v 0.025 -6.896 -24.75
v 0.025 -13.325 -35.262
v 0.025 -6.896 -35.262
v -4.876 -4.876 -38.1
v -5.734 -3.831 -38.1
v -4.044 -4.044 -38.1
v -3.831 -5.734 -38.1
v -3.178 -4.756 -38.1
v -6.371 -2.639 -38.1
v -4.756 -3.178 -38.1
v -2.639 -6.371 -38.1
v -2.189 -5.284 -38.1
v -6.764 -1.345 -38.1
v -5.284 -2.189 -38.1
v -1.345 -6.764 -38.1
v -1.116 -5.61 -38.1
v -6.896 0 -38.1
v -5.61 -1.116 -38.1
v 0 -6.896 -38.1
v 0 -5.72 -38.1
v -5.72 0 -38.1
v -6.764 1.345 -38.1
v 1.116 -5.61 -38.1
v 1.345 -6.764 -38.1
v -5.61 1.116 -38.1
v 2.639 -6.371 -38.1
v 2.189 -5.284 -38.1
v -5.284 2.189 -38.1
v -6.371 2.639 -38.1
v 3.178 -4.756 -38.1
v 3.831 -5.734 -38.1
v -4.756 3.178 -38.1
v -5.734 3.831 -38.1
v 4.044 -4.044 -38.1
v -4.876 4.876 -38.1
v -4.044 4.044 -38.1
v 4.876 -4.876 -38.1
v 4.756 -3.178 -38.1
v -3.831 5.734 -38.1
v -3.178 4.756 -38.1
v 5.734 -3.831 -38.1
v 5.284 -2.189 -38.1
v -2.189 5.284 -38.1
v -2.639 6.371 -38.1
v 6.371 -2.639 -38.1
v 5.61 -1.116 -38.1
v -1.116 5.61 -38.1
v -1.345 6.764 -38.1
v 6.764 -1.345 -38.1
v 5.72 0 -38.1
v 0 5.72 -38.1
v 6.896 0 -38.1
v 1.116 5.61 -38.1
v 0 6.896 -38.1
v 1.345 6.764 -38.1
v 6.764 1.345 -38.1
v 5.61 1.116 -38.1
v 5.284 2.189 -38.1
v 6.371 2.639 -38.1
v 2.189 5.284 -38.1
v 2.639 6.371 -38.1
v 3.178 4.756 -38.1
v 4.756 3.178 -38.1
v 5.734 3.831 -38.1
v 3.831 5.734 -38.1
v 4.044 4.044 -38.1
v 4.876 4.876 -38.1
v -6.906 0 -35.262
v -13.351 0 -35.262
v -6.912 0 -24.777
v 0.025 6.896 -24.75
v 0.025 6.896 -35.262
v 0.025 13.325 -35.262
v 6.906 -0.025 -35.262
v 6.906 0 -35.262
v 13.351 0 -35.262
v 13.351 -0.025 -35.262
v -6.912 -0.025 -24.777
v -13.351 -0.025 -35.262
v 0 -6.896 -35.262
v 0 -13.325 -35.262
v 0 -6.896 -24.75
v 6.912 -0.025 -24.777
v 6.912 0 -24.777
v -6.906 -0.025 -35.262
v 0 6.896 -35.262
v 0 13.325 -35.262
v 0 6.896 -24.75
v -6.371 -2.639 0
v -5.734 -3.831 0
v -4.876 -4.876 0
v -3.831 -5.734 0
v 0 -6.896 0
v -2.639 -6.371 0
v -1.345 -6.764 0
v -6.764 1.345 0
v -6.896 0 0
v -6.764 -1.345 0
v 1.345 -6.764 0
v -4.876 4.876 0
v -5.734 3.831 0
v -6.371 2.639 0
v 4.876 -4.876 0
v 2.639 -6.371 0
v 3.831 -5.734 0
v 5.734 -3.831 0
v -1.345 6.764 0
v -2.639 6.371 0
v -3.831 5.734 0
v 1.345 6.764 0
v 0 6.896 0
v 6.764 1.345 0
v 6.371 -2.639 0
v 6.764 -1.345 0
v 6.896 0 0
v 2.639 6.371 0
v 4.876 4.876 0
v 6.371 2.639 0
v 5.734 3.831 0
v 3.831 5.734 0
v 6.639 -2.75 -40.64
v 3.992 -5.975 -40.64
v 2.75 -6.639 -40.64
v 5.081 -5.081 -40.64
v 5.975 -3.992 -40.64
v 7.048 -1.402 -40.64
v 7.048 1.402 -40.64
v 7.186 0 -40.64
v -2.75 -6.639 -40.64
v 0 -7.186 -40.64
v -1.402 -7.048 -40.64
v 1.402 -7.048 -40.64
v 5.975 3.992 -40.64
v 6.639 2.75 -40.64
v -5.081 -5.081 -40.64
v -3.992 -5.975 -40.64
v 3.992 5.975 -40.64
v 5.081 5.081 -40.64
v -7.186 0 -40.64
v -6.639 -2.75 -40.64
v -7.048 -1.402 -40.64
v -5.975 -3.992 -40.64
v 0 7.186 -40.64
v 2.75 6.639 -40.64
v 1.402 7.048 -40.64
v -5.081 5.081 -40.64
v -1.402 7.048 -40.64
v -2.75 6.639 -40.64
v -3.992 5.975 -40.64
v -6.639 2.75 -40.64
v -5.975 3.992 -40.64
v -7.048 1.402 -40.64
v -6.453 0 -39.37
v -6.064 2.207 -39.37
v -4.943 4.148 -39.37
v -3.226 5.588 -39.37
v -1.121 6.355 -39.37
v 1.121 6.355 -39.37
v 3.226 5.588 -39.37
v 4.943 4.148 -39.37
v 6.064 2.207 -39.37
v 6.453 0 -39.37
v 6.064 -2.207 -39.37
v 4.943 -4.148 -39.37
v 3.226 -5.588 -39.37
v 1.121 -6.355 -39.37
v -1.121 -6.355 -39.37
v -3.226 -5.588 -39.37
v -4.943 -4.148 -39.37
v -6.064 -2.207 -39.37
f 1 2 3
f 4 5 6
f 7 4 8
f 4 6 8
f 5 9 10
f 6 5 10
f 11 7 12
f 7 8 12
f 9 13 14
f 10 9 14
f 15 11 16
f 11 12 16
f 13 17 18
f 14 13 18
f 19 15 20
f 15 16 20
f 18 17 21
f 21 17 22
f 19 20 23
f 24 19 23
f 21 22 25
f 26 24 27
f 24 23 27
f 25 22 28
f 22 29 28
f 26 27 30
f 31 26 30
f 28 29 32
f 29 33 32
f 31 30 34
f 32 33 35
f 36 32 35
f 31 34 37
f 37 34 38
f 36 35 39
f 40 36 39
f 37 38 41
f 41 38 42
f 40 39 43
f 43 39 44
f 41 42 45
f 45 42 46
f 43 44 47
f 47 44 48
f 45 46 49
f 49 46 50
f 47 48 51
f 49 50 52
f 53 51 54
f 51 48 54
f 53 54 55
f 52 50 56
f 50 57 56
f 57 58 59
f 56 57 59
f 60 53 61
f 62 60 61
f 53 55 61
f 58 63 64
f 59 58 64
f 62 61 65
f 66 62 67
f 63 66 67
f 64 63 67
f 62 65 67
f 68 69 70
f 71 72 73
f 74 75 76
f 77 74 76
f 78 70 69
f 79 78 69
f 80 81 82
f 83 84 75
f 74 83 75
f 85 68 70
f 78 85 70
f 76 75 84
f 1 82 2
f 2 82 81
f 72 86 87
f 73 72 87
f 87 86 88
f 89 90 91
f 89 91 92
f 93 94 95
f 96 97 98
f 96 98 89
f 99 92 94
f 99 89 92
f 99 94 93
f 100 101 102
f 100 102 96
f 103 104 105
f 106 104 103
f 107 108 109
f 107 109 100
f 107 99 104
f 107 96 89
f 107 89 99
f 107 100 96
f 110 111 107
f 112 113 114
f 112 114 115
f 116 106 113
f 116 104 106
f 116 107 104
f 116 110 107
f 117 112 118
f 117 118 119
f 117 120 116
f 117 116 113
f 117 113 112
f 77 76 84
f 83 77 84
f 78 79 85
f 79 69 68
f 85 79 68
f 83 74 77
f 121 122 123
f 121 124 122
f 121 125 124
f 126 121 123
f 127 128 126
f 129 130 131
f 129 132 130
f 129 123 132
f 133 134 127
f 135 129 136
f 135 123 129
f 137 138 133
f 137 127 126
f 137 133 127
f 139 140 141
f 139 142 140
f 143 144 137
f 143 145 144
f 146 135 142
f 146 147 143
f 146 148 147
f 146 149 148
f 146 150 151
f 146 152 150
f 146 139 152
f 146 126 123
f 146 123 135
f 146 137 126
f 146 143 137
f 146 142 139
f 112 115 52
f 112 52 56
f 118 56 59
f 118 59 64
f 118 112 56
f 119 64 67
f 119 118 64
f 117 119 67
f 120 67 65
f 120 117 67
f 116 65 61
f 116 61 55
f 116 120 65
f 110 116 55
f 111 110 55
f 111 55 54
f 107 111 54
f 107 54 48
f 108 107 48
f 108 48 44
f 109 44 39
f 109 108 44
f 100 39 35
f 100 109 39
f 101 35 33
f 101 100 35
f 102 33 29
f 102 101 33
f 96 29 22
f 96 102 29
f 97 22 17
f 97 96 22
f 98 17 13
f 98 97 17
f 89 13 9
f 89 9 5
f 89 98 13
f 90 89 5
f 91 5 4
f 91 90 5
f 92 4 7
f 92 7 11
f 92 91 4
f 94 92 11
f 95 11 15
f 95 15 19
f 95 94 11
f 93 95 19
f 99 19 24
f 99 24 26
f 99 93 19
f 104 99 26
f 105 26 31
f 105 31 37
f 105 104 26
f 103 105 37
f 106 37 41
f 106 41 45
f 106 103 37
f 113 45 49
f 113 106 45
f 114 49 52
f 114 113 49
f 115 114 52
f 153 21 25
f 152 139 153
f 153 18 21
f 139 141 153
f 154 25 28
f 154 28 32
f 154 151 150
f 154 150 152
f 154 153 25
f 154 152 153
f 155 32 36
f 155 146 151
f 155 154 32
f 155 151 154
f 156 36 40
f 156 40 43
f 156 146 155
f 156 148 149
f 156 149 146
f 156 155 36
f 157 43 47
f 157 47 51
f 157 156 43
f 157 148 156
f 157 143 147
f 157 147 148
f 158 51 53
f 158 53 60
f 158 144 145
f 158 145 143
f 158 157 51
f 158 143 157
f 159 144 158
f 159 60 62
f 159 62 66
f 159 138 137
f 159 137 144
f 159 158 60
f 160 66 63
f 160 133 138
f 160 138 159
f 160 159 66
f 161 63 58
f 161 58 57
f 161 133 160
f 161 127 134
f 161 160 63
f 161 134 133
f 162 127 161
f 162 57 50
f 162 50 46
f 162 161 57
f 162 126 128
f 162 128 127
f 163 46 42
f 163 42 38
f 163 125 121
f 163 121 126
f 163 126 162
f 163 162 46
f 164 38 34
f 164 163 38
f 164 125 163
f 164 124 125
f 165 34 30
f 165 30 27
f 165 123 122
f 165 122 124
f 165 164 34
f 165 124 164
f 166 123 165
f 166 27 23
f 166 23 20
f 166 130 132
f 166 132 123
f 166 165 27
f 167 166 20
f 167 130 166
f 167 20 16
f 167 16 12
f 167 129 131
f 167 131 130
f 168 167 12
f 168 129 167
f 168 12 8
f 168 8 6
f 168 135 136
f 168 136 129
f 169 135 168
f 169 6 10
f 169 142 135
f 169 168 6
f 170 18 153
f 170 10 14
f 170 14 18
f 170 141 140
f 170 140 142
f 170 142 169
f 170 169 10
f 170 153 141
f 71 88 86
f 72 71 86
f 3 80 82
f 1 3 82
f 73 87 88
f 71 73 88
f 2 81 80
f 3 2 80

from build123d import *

# Parameters (mm, degrees)
F0_R     = 6.8963363522
F1_DEPTH = 38.1
F3_DEPTH = 2.54
F3_TAPER = -30
F5_DEPTH = 0.0254
F7_DEPTH = 0.0254


# Not quite as in the source:
# - the program builds the solid bodies; features that only make, move or delete a surface that nothing else refers to are left out


with BuildPart() as f1:
    # F0 (on Top) → F1 (new body)
    with BuildSketch(Plane.XY):
        Circle(F0_R)
    extrude(amount=-F1_DEPTH)

    # F2 (on face) → F3 (join)
    with BuildSketch(Plane(origin=(0, 0, -38.1), x_dir=(1, 0, 0), z_dir=(0, 0, -1))):
        with BuildLine():
            Line((-5.7197166772, 0), (5.7197166772, 0))
            ThreePointArc((5.7197166772, 0), (0, 5.7197166772), (-5.7197166772, 0))
        make_face()
        with BuildLine():
            ThreePointArc((-5.7197166772, 0), (0, -5.7197166772), (5.7197166772, 0))
            Line((5.7197166772, 0), (-5.7197166772, 0))
        make_face()
    extrude(amount=F3_DEPTH, taper=F3_TAPER)


with BuildPart() as f5:
    # F4 (on Front) → F5 (new body)
    with BuildSketch(Plane.XZ):
        Polygon((13.350895606, -35.2622419596), (6.9121057168, -24.7766189277), (6.9058611989, -35.2622419596), align=None)
    extrude(amount=F5_DEPTH)


with BuildPart() as f5b:
    # F4 (on Front) → F5, piece 2 (new body)
    with BuildSketch(Plane.XZ):
        Polygon((-13.350895606, -35.2622419596), (-6.9058611989, -35.2622419596), (-6.9121057168, -24.7766189277), align=None)
    extrude(amount=F5_DEPTH)


with BuildPart() as f7:
    # F6 (on Right) → F7 (new body)
    with BuildSketch(Plane.YZ):
        Polygon((6.8963435479, -24.7504599392), (6.8963435479, -35.2618433535), (13.324634172, -35.2618433535), align=None)
    extrude(amount=F7_DEPTH)


with BuildPart() as f7b:
    # F6 (on Right) → F7, piece 2 (new body)
    with BuildSketch(Plane.YZ):
        Polygon((-13.324634172, -35.2618433535), (-6.8963435479, -35.2618433535), (-6.8963435479, -24.7504599392), align=None)
    extrude(amount=F7_DEPTH)


solid = Compound([f1.part, f5.part, f5b.part, f7.part, f7b.part])
